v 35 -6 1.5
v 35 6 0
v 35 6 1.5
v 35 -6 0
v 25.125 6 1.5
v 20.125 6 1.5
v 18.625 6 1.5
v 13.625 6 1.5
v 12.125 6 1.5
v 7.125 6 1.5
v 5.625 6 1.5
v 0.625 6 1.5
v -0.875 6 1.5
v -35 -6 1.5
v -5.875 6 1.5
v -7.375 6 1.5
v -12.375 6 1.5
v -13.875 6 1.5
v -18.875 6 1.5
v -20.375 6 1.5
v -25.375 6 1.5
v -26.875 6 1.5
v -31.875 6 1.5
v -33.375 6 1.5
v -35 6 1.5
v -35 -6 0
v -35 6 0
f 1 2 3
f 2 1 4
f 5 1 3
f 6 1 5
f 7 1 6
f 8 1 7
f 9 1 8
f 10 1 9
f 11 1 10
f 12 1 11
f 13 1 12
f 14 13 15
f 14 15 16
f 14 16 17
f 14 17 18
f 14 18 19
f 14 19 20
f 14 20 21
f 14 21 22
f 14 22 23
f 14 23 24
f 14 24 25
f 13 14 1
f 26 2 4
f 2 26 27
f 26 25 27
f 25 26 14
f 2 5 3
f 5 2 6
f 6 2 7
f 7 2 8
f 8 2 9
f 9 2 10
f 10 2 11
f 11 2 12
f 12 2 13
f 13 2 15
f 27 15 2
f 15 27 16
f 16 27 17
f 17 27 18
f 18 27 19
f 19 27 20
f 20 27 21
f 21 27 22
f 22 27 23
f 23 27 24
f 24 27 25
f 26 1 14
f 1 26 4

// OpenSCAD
// 10-well comb for agarose gel casting, printed lying flat
// Units: mm

// ---- Spine ----
spine_len   = 70;    // spine length along X
spine_wid   = 12;    // spine width along Y
plate_thk   = 1.5;   // plate thickness (Z)

// ---- Teeth ----
tooth_count = 10;    // number of wells
tooth_w     = 5.0;   // tooth width along X
tooth_l     = 12;    // tooth length along Y (from top edge of spine)
gap         = 1.5;   // gap between neighbouring teeth

// ---- Misc ----
eps         = 0.5;   // cutter overshoot past faces
$fn         = 64;

// Derived
pitch       = tooth_w + gap;                 // centre-to-centre spacing
row_span    = (tooth_count - 1) * gap;       // total gap width
x_start     = -spine_len/2 + tooth_w/2 - row_span/2/2; // first tooth centre X

difference() {
    // Base plate
    translate([-spine_len/2, -spine_wid/2, 0])
        cube([spine_len, spine_wid, plate_thk]);

    // Teeth (cutters extend past top face)
    for (i = [0 : tooth_count - 1]) {
        translate([x_start + i * pitch - tooth_w/2,
                   spine_wid/2,
                   plate_thk])
            cube([tooth_w, tooth_l + eps, eps]);
    }
}
